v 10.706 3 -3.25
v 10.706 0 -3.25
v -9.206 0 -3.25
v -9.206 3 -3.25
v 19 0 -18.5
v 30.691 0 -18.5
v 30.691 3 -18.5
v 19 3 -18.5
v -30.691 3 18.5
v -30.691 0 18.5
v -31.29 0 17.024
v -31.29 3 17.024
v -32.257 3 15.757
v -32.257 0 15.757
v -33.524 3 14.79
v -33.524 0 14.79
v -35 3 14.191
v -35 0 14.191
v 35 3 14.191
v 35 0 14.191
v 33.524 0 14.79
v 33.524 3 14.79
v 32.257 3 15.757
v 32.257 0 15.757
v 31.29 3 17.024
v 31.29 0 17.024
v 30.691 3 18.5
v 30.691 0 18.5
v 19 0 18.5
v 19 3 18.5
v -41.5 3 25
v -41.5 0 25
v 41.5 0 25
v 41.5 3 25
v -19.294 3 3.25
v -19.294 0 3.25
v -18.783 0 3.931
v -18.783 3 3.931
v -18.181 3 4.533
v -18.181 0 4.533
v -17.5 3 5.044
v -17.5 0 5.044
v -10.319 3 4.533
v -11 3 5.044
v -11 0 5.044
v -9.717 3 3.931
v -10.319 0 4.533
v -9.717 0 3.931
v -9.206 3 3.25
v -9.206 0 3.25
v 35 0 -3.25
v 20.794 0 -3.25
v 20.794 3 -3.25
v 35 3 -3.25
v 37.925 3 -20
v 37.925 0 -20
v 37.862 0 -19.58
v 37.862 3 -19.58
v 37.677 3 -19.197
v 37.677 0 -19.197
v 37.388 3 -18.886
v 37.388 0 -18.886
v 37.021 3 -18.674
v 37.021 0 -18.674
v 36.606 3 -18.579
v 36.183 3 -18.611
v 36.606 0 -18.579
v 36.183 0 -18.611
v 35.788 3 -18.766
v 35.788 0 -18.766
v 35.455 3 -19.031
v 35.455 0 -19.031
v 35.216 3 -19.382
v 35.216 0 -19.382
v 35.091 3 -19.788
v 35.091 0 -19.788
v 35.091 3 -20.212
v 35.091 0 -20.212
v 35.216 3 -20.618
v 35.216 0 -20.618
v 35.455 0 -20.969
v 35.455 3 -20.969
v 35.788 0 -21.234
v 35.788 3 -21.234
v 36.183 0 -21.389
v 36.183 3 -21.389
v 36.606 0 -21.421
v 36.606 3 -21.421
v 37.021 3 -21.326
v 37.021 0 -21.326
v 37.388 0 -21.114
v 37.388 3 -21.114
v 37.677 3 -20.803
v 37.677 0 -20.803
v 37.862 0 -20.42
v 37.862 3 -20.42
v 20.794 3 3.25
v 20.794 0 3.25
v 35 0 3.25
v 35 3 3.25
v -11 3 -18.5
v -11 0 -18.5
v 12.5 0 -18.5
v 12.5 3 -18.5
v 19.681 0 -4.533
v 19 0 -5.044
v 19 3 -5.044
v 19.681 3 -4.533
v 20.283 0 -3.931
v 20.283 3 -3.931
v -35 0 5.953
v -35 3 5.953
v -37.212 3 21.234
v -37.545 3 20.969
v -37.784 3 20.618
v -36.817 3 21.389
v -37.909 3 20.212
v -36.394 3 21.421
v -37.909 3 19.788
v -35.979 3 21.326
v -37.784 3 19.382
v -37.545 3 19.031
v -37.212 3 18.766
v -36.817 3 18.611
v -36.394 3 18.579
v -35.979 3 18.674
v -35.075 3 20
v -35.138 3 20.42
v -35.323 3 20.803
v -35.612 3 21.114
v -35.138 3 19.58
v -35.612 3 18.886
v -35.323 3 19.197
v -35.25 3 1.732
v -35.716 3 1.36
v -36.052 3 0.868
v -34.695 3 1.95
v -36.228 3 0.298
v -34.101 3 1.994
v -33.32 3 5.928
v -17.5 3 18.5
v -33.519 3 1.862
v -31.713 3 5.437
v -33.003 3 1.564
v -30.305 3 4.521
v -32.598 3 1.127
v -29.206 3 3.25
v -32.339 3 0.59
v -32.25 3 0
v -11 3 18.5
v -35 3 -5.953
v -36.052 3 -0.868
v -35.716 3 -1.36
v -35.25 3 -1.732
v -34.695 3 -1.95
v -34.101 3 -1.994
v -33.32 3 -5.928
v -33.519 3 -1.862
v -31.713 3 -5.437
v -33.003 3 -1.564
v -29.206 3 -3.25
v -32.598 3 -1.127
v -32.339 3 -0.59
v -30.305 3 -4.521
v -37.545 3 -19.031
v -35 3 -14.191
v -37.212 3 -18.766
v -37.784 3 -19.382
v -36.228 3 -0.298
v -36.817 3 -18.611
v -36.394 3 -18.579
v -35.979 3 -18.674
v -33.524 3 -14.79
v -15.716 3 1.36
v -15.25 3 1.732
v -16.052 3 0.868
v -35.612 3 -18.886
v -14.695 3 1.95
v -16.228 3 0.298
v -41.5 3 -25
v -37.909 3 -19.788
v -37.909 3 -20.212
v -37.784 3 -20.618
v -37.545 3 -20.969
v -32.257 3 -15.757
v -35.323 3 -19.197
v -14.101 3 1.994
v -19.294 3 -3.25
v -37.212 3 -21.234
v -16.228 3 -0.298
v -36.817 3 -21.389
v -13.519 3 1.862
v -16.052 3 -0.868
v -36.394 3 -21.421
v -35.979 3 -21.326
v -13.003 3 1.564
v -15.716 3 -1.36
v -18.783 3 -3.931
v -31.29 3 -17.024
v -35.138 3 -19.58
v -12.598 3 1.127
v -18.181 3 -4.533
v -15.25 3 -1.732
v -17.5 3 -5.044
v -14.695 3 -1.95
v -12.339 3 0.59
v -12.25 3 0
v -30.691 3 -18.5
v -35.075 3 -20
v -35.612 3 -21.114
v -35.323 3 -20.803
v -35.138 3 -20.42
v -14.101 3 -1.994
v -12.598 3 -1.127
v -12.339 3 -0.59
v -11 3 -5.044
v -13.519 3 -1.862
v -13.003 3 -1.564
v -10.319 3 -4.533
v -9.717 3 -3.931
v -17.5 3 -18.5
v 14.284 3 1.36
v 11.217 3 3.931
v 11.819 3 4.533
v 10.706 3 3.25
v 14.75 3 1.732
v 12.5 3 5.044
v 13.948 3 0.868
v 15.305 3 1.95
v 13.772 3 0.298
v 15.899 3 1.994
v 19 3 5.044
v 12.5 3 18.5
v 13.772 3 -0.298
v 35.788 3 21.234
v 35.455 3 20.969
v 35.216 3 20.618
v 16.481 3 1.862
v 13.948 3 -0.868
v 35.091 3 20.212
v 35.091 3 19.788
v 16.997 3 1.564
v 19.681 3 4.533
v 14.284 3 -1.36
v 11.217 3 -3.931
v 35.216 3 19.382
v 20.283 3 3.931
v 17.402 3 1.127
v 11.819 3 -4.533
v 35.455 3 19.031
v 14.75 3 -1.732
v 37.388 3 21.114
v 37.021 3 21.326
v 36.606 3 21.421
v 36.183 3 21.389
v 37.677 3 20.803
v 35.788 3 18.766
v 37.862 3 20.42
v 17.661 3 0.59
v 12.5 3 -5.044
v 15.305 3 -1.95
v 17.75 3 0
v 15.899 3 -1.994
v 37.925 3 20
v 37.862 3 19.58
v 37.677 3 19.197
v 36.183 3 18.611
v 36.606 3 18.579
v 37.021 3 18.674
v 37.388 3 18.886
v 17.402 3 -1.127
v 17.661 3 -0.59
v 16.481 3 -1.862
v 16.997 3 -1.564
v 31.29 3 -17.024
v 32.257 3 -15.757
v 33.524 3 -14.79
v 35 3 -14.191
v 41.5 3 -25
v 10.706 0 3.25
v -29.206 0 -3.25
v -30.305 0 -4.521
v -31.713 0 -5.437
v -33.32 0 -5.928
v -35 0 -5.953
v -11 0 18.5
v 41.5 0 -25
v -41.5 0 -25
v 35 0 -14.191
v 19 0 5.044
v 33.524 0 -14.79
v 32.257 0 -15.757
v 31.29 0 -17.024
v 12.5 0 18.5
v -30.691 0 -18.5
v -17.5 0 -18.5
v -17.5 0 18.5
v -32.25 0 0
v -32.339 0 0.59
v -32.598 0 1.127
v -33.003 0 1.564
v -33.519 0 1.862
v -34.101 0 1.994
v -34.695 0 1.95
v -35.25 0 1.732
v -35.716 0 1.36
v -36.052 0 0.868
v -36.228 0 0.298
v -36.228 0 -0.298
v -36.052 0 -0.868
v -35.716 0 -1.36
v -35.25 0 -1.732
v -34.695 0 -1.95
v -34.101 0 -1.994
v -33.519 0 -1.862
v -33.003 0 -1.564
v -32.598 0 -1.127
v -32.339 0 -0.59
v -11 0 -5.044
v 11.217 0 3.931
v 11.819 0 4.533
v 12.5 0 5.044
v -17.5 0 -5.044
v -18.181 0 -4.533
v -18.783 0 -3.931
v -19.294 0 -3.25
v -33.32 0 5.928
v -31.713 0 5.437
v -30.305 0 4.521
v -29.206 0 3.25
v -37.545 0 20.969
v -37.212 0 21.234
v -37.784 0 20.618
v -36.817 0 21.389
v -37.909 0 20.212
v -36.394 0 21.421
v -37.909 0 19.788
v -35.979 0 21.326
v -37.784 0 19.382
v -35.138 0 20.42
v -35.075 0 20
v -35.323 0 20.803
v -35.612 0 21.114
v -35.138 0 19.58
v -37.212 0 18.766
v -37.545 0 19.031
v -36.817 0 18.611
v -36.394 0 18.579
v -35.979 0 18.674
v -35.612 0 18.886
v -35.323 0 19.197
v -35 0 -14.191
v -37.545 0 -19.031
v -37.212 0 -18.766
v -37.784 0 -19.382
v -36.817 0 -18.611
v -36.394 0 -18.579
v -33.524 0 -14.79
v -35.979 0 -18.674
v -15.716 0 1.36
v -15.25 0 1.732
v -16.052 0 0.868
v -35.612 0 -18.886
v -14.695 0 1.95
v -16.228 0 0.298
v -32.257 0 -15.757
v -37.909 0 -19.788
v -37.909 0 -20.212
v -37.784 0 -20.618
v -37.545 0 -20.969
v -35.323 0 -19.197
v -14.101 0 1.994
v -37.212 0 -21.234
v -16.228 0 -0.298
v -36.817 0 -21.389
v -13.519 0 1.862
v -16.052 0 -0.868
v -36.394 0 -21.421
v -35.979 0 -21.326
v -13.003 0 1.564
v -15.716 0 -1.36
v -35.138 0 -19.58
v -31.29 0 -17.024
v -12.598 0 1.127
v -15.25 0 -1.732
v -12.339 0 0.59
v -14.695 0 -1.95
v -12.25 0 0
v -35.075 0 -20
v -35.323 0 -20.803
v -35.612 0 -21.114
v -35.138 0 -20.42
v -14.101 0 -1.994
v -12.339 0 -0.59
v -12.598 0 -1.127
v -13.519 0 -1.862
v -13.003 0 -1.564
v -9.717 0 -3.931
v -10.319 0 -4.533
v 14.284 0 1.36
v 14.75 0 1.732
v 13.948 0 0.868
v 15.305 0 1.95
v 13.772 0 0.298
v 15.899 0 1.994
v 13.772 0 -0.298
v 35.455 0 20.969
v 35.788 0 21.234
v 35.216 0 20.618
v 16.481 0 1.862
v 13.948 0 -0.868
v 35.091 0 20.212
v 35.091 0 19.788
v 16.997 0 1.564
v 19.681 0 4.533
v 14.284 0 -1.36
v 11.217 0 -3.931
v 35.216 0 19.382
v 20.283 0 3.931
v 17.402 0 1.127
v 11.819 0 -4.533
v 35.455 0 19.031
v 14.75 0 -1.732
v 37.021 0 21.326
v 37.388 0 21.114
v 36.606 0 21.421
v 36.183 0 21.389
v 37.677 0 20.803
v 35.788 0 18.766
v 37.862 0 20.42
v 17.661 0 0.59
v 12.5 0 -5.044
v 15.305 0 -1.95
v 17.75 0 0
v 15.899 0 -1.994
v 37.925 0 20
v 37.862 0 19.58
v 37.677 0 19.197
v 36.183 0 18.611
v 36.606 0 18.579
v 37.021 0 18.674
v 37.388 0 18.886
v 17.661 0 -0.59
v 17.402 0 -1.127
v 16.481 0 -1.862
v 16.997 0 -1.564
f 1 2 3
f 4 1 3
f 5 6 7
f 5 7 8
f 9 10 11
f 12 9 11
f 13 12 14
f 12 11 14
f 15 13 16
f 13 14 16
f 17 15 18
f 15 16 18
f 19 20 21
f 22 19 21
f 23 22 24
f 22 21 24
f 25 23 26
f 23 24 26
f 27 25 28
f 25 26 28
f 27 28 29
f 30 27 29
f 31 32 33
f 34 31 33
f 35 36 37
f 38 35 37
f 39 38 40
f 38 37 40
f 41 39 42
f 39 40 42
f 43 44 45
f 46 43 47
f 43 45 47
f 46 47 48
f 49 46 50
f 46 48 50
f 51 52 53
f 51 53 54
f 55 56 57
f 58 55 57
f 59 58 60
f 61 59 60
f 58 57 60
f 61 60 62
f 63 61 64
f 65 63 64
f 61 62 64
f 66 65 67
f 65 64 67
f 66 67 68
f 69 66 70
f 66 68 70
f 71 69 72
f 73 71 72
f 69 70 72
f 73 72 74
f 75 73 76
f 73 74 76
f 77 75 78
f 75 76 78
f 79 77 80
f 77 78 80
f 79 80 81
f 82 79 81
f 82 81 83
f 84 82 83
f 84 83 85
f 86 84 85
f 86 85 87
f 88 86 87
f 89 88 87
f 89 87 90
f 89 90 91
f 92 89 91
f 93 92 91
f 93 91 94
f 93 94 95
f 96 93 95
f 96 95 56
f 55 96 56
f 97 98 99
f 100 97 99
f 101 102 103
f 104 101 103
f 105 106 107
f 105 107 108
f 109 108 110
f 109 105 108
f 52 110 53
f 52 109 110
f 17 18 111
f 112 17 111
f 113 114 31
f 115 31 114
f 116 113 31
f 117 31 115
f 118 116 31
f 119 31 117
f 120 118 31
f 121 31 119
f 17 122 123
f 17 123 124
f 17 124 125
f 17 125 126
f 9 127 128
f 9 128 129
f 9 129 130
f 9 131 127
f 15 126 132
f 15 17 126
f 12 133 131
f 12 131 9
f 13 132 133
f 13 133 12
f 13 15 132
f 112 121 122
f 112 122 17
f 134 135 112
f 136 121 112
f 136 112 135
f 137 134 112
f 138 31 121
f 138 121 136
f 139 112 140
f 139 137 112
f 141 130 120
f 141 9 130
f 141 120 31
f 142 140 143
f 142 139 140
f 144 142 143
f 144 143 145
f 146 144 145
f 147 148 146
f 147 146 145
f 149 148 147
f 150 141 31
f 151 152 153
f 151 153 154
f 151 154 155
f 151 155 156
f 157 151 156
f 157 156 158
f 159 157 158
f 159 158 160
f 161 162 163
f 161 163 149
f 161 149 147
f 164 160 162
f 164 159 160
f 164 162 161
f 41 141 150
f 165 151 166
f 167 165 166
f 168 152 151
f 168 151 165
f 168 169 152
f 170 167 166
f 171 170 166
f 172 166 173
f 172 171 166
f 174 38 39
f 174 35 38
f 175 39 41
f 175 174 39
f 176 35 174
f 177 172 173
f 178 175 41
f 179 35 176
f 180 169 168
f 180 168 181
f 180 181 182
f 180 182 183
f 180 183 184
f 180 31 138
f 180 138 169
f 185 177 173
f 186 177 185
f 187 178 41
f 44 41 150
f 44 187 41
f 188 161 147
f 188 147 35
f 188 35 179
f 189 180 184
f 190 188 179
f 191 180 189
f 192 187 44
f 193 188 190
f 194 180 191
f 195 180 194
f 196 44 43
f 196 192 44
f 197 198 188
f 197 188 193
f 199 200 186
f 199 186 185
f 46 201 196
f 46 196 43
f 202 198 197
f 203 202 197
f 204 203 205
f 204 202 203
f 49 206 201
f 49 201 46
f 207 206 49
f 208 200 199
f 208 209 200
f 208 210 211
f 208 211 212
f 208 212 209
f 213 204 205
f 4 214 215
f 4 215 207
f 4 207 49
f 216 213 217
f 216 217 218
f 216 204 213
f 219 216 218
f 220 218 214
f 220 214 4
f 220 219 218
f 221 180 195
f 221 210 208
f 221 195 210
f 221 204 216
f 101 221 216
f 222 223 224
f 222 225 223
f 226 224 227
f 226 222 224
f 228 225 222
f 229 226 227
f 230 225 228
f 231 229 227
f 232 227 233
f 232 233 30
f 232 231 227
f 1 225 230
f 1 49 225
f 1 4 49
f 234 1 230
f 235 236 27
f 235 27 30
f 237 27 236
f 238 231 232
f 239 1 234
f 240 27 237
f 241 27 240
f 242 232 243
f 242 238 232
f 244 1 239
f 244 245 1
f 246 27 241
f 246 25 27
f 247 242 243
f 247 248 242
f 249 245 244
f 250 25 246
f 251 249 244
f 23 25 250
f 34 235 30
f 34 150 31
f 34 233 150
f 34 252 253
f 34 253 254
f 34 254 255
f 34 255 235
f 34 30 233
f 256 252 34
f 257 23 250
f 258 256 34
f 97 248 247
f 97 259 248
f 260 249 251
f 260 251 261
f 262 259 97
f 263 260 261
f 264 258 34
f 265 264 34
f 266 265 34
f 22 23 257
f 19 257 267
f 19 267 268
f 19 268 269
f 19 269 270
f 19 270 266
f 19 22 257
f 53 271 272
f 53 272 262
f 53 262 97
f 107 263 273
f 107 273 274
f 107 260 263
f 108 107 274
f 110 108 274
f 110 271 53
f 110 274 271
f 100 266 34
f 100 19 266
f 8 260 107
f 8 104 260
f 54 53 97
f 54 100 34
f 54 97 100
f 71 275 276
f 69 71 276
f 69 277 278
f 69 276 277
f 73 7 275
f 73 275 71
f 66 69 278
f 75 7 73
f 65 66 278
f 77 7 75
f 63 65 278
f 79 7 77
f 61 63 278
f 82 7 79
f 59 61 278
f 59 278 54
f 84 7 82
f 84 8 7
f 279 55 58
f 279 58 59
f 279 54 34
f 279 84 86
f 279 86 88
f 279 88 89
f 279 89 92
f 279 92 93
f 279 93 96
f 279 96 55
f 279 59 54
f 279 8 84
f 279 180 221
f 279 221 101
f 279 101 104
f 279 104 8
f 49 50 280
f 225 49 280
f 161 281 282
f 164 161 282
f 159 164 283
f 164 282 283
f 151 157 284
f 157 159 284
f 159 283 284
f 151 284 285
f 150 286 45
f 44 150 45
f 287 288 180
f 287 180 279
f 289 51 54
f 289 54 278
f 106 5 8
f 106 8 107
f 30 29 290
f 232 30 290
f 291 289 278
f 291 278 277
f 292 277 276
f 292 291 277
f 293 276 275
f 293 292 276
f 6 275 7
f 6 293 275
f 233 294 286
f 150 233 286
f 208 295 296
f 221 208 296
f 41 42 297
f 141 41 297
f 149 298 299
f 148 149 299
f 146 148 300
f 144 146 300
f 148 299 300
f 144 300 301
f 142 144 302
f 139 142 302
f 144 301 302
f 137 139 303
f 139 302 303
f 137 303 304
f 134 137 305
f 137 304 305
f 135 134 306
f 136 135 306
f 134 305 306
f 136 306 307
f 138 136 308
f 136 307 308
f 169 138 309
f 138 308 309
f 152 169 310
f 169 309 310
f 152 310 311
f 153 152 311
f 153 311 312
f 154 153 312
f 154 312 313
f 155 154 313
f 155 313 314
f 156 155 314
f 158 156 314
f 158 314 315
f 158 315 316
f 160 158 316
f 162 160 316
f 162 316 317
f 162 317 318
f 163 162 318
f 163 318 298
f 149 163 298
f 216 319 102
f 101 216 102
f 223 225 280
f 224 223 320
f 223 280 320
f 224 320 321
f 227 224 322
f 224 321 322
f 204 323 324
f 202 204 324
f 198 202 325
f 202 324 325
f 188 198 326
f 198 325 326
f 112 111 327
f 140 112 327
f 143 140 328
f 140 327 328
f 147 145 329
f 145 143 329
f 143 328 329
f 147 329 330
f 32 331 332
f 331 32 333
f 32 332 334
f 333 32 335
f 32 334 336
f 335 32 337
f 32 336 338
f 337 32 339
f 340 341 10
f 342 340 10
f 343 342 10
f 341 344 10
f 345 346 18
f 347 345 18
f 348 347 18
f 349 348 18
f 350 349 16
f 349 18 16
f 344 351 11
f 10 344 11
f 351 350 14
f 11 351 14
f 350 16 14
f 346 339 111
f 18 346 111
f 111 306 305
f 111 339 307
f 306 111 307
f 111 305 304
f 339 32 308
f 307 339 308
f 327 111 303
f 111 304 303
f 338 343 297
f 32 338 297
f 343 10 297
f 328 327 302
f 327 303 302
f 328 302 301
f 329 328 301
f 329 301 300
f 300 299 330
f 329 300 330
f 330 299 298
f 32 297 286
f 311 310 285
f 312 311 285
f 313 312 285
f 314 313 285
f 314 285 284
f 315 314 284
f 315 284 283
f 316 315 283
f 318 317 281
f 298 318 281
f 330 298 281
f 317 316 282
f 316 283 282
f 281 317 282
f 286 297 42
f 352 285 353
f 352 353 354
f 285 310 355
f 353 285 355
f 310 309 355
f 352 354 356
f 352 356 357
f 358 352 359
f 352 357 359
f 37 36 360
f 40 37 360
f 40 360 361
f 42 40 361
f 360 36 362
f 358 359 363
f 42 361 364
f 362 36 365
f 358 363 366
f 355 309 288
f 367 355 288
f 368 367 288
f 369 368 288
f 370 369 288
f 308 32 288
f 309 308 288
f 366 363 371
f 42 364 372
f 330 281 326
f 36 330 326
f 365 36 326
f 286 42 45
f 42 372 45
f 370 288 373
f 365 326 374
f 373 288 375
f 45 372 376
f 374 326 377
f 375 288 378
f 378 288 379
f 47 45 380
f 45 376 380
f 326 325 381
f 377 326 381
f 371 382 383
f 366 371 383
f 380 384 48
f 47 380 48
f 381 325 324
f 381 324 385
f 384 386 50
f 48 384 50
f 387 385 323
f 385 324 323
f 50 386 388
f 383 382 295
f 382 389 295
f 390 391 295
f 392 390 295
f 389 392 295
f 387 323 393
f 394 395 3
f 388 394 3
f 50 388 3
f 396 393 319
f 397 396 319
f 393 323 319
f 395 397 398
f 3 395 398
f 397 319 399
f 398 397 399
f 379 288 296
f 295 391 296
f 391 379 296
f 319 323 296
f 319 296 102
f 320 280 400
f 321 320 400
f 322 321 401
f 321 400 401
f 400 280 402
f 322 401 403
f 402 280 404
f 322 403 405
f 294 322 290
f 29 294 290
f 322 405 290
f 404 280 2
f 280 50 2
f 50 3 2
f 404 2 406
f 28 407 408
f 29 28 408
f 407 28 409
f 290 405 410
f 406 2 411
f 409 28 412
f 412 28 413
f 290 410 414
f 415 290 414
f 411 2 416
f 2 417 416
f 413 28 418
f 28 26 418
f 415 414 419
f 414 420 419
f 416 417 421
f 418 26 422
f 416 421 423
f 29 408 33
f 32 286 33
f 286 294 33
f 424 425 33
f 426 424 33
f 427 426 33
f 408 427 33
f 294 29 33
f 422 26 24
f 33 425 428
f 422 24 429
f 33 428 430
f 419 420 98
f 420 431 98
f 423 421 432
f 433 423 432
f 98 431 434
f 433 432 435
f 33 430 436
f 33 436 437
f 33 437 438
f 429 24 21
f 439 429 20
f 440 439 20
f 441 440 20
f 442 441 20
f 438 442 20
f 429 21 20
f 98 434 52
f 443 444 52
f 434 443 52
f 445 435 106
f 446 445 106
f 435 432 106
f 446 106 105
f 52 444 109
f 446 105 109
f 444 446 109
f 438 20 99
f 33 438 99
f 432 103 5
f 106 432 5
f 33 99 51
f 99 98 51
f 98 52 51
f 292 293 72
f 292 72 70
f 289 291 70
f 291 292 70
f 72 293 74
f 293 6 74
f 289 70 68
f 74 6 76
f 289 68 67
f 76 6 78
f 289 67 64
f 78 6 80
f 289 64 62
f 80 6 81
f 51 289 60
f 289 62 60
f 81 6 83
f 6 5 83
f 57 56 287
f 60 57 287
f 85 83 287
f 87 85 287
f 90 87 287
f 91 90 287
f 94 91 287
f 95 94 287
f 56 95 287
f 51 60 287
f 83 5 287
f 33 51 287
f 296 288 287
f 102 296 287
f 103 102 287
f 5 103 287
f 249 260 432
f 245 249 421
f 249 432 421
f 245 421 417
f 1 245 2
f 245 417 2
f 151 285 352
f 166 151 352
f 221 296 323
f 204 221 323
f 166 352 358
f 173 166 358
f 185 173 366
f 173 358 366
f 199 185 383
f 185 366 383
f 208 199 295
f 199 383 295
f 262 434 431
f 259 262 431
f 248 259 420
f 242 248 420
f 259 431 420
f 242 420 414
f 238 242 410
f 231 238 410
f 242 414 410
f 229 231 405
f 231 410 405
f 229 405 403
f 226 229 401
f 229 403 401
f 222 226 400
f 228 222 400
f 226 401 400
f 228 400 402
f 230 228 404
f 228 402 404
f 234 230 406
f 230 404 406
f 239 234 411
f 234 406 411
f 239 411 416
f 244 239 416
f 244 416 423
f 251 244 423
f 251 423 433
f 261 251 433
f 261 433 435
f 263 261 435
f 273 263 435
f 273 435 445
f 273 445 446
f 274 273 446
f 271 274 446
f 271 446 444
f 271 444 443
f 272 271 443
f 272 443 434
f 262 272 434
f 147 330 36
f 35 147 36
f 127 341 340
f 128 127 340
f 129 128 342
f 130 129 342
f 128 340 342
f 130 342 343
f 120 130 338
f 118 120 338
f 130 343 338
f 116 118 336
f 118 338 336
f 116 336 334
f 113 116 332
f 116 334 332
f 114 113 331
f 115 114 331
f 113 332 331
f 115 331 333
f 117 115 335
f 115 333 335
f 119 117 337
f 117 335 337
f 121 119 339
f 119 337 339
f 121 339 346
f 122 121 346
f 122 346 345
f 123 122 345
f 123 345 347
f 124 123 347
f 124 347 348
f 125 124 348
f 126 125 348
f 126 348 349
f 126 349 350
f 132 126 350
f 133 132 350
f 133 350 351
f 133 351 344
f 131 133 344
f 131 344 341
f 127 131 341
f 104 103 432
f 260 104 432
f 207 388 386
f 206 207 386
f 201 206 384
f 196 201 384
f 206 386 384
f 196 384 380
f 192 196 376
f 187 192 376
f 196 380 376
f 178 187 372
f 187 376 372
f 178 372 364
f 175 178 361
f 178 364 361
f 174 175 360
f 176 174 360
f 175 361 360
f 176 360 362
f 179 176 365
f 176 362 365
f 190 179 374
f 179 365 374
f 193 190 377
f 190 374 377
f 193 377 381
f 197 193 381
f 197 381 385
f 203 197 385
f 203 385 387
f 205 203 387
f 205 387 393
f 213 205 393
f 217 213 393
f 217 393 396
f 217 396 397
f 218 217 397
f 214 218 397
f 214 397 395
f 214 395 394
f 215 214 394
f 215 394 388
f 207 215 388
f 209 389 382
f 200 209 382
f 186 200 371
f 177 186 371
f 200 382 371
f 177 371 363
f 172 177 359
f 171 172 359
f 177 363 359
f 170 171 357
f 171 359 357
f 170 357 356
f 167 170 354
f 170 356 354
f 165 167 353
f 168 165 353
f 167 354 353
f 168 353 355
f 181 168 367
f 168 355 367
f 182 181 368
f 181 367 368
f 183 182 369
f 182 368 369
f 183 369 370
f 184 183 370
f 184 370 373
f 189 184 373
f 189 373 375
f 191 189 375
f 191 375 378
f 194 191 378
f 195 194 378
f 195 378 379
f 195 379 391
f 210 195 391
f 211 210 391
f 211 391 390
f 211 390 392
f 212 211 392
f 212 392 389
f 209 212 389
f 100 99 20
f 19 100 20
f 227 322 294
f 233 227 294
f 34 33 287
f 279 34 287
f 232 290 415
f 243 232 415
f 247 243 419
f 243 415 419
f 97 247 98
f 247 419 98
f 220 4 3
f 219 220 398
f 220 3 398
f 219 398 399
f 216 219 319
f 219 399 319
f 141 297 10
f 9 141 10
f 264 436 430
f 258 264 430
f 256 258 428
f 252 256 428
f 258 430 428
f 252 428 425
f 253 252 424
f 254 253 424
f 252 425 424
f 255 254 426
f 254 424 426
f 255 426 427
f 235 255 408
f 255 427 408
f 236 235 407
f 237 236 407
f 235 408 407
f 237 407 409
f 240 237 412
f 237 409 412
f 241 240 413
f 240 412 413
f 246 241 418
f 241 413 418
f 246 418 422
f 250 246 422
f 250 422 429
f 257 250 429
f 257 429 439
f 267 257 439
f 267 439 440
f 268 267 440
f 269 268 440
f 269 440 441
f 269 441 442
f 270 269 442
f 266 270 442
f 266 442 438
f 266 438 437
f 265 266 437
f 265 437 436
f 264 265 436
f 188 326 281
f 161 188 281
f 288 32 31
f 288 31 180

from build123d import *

# Parameters (mm, degrees)
SKETCH1_W            = 83
SKETCH1_H            = 50
BOSS_EXTRUDE1_DEPTH  = 3
SKETCH2_R            = 2
CUT_EXTRUDE1_DEPTH   = 4
SKETCH3_R            = 1.425
CUT_EXTRUDE2_DEPTH   = 4
LPATTERN1_COUNT      = 2
LPATTERN1_PITCH      = 73
LPATTERN1_COUNT_DIR2 = 2
LPATTERN1_PITCH_DIR2 = 40
CUT_EXTRUDE3_DEPTH   = 10


with BuildPart() as part:
    # Sketch1 → Boss-Extrude1 (new body)
    with BuildSketch(Plane(origin=(0, 0, 0), x_dir=(1, 0, 0), z_dir=(0, 1, 0))):
        Rectangle(SKETCH1_W, SKETCH1_H)
    extrude(amount=BOSS_EXTRUDE1_DEPTH)

    # Sketch2 → Cut-Extrude1 (cut, through all)
    with BuildSketch(Plane.XZ):
        with Locations((-34.25, 0)):
            Circle(SKETCH2_R)
        with Locations((-14.25, 0)):
            Circle(SKETCH2_R)
        with Locations((15.75, 0)):
            Circle(SKETCH2_R)
    extrude(amount=-CUT_EXTRUDE1_DEPTH, mode=Mode.SUBTRACT)

    # Sketch3 → Cut-Extrude2 (cut, through all)
    with BuildSketch(Plane.XZ):
        with Locations((-36.5, -20)):
            Circle(SKETCH3_R)
    cut_extrude2 = extrude(amount=-CUT_EXTRUDE2_DEPTH, mode=Mode.SUBTRACT)

    # LPattern1: Cut-Extrude2 2 × 2
    with Locations(*[(i * LPATTERN1_PITCH, 0, j * LPATTERN1_PITCH_DIR2) for i in range(LPATTERN1_COUNT) for j in range(LPATTERN1_COUNT_DIR2) if (i, j) != (0, 0)]):
        add(cut_extrude2, mode=Mode.SUBTRACT)

    # Sketch4 → Cut-Extrude3 (cut)
    with BuildSketch(Plane.XZ):
        with BuildLine():
            Line((0, 18.5), (-11, 18.5))
            Line((-11, 18.5), (-11, 5.04356025))
            ThreePointArc((-11, 5.04356025), (-10.007359313, 4.242640687), (-9.20643975, 3.25))
            Line((-9.20643975, 3.25), (0, 3.25))
            Line((0, 3.25), (10.70643975, 3.25))
            ThreePointArc((10.70643975, 3.25), (11.507359313, 4.242640687), (12.5, 5.04356025))
            Line((12.5, 5.04356025), (12.5, 18.5))
            Line((12.5, 18.5), (0, 18.5))
        make_face()
        with BuildLine():
            Line((0, -3.25), (-9.20643975, -3.25))
            ThreePointArc((-9.20643975, -3.25), (-10.007359313, -4.242640687), (-11, -5.04356025))
            Line((-11, -5.04356025), (-11, -18.5))
            Line((-11, -18.5), (0, -18.5))
            Line((0, -18.5), (12.5, -18.5))
            Line((12.5, -18.5), (12.5, -5.04356025))
            ThreePointArc((12.5, -5.04356025), (11.507359313, -4.242640687), (10.70643975, -3.25))
            Line((10.70643975, -3.25), (0, -3.25))
        make_face()
        with BuildLine():
            Line((-17.5, 18.5), (-30.690524981, 18.5))
            ThreePointArc((-30.690524981, 18.5), (-32.257359313, 15.757359313), (-35, 14.190524981))
            Line((-35, 14.190524981), (-35, 5.95294045))
            ThreePointArc((-35, 5.95294045), (-31.713242882, 5.43735812), (-29.20643975, 3.25))
            Line((-29.20643975, 3.25), (-19.29356025, 3.25))
            ThreePointArc((-19.29356025, 3.25), (-18.492640687, 4.242640687), (-17.5, 5.04356025))
            Line((-17.5, 5.04356025), (-17.5, 18.5))
        make_face()
        with BuildLine():
            Line((-19.29356025, -3.25), (-29.20643975, -3.25))
            ThreePointArc((-29.20643975, -3.25), (-31.713242882, -5.43735812), (-35, -5.95294045))
            Line((-35, -5.95294045), (-35, -14.190524981))
            ThreePointArc((-35, -14.190524981), (-32.257359313, -15.757359313), (-30.690524981, -18.5))
            Line((-30.690524981, -18.5), (-17.5, -18.5))
            Line((-17.5, -18.5), (-17.5, -5.04356025))
            ThreePointArc((-17.5, -5.04356025), (-18.492640687, -4.242640687), (-19.29356025, -3.25))
        make_face()
        with BuildLine():
            Line((20.79356025, 3.25), (35, 3.25))
            Line((35, 3.25), (35, 14.190524981))
            ThreePointArc((35, 14.190524981), (32.257359313, 15.757359313), (30.690524981, 18.5))
            Line((30.690524981, 18.5), (19, 18.5))
            Line((19, 18.5), (19, 5.04356025))
            ThreePointArc((19, 5.04356025), (19.992640687, 4.242640687), (20.79356025, 3.25))
        make_face()
        with BuildLine():
            Line((20.79356025, -3.25), (35, -3.25))
            Line((35, -3.25), (35, -14.190524981))
            ThreePointArc((35, -14.190524981), (32.257359313, -15.757359313), (30.690524981, -18.5))
            Line((30.690524981, -18.5), (19, -18.5))
            Line((19, -18.5), (19, -5.04356025))
            ThreePointArc((19, -5.04356025), (19.992640687, -4.242640687), (20.79356025, -3.25))
        make_face()
    extrude(amount=-CUT_EXTRUDE3_DEPTH, mode=Mode.SUBTRACT)


solid = part.part
